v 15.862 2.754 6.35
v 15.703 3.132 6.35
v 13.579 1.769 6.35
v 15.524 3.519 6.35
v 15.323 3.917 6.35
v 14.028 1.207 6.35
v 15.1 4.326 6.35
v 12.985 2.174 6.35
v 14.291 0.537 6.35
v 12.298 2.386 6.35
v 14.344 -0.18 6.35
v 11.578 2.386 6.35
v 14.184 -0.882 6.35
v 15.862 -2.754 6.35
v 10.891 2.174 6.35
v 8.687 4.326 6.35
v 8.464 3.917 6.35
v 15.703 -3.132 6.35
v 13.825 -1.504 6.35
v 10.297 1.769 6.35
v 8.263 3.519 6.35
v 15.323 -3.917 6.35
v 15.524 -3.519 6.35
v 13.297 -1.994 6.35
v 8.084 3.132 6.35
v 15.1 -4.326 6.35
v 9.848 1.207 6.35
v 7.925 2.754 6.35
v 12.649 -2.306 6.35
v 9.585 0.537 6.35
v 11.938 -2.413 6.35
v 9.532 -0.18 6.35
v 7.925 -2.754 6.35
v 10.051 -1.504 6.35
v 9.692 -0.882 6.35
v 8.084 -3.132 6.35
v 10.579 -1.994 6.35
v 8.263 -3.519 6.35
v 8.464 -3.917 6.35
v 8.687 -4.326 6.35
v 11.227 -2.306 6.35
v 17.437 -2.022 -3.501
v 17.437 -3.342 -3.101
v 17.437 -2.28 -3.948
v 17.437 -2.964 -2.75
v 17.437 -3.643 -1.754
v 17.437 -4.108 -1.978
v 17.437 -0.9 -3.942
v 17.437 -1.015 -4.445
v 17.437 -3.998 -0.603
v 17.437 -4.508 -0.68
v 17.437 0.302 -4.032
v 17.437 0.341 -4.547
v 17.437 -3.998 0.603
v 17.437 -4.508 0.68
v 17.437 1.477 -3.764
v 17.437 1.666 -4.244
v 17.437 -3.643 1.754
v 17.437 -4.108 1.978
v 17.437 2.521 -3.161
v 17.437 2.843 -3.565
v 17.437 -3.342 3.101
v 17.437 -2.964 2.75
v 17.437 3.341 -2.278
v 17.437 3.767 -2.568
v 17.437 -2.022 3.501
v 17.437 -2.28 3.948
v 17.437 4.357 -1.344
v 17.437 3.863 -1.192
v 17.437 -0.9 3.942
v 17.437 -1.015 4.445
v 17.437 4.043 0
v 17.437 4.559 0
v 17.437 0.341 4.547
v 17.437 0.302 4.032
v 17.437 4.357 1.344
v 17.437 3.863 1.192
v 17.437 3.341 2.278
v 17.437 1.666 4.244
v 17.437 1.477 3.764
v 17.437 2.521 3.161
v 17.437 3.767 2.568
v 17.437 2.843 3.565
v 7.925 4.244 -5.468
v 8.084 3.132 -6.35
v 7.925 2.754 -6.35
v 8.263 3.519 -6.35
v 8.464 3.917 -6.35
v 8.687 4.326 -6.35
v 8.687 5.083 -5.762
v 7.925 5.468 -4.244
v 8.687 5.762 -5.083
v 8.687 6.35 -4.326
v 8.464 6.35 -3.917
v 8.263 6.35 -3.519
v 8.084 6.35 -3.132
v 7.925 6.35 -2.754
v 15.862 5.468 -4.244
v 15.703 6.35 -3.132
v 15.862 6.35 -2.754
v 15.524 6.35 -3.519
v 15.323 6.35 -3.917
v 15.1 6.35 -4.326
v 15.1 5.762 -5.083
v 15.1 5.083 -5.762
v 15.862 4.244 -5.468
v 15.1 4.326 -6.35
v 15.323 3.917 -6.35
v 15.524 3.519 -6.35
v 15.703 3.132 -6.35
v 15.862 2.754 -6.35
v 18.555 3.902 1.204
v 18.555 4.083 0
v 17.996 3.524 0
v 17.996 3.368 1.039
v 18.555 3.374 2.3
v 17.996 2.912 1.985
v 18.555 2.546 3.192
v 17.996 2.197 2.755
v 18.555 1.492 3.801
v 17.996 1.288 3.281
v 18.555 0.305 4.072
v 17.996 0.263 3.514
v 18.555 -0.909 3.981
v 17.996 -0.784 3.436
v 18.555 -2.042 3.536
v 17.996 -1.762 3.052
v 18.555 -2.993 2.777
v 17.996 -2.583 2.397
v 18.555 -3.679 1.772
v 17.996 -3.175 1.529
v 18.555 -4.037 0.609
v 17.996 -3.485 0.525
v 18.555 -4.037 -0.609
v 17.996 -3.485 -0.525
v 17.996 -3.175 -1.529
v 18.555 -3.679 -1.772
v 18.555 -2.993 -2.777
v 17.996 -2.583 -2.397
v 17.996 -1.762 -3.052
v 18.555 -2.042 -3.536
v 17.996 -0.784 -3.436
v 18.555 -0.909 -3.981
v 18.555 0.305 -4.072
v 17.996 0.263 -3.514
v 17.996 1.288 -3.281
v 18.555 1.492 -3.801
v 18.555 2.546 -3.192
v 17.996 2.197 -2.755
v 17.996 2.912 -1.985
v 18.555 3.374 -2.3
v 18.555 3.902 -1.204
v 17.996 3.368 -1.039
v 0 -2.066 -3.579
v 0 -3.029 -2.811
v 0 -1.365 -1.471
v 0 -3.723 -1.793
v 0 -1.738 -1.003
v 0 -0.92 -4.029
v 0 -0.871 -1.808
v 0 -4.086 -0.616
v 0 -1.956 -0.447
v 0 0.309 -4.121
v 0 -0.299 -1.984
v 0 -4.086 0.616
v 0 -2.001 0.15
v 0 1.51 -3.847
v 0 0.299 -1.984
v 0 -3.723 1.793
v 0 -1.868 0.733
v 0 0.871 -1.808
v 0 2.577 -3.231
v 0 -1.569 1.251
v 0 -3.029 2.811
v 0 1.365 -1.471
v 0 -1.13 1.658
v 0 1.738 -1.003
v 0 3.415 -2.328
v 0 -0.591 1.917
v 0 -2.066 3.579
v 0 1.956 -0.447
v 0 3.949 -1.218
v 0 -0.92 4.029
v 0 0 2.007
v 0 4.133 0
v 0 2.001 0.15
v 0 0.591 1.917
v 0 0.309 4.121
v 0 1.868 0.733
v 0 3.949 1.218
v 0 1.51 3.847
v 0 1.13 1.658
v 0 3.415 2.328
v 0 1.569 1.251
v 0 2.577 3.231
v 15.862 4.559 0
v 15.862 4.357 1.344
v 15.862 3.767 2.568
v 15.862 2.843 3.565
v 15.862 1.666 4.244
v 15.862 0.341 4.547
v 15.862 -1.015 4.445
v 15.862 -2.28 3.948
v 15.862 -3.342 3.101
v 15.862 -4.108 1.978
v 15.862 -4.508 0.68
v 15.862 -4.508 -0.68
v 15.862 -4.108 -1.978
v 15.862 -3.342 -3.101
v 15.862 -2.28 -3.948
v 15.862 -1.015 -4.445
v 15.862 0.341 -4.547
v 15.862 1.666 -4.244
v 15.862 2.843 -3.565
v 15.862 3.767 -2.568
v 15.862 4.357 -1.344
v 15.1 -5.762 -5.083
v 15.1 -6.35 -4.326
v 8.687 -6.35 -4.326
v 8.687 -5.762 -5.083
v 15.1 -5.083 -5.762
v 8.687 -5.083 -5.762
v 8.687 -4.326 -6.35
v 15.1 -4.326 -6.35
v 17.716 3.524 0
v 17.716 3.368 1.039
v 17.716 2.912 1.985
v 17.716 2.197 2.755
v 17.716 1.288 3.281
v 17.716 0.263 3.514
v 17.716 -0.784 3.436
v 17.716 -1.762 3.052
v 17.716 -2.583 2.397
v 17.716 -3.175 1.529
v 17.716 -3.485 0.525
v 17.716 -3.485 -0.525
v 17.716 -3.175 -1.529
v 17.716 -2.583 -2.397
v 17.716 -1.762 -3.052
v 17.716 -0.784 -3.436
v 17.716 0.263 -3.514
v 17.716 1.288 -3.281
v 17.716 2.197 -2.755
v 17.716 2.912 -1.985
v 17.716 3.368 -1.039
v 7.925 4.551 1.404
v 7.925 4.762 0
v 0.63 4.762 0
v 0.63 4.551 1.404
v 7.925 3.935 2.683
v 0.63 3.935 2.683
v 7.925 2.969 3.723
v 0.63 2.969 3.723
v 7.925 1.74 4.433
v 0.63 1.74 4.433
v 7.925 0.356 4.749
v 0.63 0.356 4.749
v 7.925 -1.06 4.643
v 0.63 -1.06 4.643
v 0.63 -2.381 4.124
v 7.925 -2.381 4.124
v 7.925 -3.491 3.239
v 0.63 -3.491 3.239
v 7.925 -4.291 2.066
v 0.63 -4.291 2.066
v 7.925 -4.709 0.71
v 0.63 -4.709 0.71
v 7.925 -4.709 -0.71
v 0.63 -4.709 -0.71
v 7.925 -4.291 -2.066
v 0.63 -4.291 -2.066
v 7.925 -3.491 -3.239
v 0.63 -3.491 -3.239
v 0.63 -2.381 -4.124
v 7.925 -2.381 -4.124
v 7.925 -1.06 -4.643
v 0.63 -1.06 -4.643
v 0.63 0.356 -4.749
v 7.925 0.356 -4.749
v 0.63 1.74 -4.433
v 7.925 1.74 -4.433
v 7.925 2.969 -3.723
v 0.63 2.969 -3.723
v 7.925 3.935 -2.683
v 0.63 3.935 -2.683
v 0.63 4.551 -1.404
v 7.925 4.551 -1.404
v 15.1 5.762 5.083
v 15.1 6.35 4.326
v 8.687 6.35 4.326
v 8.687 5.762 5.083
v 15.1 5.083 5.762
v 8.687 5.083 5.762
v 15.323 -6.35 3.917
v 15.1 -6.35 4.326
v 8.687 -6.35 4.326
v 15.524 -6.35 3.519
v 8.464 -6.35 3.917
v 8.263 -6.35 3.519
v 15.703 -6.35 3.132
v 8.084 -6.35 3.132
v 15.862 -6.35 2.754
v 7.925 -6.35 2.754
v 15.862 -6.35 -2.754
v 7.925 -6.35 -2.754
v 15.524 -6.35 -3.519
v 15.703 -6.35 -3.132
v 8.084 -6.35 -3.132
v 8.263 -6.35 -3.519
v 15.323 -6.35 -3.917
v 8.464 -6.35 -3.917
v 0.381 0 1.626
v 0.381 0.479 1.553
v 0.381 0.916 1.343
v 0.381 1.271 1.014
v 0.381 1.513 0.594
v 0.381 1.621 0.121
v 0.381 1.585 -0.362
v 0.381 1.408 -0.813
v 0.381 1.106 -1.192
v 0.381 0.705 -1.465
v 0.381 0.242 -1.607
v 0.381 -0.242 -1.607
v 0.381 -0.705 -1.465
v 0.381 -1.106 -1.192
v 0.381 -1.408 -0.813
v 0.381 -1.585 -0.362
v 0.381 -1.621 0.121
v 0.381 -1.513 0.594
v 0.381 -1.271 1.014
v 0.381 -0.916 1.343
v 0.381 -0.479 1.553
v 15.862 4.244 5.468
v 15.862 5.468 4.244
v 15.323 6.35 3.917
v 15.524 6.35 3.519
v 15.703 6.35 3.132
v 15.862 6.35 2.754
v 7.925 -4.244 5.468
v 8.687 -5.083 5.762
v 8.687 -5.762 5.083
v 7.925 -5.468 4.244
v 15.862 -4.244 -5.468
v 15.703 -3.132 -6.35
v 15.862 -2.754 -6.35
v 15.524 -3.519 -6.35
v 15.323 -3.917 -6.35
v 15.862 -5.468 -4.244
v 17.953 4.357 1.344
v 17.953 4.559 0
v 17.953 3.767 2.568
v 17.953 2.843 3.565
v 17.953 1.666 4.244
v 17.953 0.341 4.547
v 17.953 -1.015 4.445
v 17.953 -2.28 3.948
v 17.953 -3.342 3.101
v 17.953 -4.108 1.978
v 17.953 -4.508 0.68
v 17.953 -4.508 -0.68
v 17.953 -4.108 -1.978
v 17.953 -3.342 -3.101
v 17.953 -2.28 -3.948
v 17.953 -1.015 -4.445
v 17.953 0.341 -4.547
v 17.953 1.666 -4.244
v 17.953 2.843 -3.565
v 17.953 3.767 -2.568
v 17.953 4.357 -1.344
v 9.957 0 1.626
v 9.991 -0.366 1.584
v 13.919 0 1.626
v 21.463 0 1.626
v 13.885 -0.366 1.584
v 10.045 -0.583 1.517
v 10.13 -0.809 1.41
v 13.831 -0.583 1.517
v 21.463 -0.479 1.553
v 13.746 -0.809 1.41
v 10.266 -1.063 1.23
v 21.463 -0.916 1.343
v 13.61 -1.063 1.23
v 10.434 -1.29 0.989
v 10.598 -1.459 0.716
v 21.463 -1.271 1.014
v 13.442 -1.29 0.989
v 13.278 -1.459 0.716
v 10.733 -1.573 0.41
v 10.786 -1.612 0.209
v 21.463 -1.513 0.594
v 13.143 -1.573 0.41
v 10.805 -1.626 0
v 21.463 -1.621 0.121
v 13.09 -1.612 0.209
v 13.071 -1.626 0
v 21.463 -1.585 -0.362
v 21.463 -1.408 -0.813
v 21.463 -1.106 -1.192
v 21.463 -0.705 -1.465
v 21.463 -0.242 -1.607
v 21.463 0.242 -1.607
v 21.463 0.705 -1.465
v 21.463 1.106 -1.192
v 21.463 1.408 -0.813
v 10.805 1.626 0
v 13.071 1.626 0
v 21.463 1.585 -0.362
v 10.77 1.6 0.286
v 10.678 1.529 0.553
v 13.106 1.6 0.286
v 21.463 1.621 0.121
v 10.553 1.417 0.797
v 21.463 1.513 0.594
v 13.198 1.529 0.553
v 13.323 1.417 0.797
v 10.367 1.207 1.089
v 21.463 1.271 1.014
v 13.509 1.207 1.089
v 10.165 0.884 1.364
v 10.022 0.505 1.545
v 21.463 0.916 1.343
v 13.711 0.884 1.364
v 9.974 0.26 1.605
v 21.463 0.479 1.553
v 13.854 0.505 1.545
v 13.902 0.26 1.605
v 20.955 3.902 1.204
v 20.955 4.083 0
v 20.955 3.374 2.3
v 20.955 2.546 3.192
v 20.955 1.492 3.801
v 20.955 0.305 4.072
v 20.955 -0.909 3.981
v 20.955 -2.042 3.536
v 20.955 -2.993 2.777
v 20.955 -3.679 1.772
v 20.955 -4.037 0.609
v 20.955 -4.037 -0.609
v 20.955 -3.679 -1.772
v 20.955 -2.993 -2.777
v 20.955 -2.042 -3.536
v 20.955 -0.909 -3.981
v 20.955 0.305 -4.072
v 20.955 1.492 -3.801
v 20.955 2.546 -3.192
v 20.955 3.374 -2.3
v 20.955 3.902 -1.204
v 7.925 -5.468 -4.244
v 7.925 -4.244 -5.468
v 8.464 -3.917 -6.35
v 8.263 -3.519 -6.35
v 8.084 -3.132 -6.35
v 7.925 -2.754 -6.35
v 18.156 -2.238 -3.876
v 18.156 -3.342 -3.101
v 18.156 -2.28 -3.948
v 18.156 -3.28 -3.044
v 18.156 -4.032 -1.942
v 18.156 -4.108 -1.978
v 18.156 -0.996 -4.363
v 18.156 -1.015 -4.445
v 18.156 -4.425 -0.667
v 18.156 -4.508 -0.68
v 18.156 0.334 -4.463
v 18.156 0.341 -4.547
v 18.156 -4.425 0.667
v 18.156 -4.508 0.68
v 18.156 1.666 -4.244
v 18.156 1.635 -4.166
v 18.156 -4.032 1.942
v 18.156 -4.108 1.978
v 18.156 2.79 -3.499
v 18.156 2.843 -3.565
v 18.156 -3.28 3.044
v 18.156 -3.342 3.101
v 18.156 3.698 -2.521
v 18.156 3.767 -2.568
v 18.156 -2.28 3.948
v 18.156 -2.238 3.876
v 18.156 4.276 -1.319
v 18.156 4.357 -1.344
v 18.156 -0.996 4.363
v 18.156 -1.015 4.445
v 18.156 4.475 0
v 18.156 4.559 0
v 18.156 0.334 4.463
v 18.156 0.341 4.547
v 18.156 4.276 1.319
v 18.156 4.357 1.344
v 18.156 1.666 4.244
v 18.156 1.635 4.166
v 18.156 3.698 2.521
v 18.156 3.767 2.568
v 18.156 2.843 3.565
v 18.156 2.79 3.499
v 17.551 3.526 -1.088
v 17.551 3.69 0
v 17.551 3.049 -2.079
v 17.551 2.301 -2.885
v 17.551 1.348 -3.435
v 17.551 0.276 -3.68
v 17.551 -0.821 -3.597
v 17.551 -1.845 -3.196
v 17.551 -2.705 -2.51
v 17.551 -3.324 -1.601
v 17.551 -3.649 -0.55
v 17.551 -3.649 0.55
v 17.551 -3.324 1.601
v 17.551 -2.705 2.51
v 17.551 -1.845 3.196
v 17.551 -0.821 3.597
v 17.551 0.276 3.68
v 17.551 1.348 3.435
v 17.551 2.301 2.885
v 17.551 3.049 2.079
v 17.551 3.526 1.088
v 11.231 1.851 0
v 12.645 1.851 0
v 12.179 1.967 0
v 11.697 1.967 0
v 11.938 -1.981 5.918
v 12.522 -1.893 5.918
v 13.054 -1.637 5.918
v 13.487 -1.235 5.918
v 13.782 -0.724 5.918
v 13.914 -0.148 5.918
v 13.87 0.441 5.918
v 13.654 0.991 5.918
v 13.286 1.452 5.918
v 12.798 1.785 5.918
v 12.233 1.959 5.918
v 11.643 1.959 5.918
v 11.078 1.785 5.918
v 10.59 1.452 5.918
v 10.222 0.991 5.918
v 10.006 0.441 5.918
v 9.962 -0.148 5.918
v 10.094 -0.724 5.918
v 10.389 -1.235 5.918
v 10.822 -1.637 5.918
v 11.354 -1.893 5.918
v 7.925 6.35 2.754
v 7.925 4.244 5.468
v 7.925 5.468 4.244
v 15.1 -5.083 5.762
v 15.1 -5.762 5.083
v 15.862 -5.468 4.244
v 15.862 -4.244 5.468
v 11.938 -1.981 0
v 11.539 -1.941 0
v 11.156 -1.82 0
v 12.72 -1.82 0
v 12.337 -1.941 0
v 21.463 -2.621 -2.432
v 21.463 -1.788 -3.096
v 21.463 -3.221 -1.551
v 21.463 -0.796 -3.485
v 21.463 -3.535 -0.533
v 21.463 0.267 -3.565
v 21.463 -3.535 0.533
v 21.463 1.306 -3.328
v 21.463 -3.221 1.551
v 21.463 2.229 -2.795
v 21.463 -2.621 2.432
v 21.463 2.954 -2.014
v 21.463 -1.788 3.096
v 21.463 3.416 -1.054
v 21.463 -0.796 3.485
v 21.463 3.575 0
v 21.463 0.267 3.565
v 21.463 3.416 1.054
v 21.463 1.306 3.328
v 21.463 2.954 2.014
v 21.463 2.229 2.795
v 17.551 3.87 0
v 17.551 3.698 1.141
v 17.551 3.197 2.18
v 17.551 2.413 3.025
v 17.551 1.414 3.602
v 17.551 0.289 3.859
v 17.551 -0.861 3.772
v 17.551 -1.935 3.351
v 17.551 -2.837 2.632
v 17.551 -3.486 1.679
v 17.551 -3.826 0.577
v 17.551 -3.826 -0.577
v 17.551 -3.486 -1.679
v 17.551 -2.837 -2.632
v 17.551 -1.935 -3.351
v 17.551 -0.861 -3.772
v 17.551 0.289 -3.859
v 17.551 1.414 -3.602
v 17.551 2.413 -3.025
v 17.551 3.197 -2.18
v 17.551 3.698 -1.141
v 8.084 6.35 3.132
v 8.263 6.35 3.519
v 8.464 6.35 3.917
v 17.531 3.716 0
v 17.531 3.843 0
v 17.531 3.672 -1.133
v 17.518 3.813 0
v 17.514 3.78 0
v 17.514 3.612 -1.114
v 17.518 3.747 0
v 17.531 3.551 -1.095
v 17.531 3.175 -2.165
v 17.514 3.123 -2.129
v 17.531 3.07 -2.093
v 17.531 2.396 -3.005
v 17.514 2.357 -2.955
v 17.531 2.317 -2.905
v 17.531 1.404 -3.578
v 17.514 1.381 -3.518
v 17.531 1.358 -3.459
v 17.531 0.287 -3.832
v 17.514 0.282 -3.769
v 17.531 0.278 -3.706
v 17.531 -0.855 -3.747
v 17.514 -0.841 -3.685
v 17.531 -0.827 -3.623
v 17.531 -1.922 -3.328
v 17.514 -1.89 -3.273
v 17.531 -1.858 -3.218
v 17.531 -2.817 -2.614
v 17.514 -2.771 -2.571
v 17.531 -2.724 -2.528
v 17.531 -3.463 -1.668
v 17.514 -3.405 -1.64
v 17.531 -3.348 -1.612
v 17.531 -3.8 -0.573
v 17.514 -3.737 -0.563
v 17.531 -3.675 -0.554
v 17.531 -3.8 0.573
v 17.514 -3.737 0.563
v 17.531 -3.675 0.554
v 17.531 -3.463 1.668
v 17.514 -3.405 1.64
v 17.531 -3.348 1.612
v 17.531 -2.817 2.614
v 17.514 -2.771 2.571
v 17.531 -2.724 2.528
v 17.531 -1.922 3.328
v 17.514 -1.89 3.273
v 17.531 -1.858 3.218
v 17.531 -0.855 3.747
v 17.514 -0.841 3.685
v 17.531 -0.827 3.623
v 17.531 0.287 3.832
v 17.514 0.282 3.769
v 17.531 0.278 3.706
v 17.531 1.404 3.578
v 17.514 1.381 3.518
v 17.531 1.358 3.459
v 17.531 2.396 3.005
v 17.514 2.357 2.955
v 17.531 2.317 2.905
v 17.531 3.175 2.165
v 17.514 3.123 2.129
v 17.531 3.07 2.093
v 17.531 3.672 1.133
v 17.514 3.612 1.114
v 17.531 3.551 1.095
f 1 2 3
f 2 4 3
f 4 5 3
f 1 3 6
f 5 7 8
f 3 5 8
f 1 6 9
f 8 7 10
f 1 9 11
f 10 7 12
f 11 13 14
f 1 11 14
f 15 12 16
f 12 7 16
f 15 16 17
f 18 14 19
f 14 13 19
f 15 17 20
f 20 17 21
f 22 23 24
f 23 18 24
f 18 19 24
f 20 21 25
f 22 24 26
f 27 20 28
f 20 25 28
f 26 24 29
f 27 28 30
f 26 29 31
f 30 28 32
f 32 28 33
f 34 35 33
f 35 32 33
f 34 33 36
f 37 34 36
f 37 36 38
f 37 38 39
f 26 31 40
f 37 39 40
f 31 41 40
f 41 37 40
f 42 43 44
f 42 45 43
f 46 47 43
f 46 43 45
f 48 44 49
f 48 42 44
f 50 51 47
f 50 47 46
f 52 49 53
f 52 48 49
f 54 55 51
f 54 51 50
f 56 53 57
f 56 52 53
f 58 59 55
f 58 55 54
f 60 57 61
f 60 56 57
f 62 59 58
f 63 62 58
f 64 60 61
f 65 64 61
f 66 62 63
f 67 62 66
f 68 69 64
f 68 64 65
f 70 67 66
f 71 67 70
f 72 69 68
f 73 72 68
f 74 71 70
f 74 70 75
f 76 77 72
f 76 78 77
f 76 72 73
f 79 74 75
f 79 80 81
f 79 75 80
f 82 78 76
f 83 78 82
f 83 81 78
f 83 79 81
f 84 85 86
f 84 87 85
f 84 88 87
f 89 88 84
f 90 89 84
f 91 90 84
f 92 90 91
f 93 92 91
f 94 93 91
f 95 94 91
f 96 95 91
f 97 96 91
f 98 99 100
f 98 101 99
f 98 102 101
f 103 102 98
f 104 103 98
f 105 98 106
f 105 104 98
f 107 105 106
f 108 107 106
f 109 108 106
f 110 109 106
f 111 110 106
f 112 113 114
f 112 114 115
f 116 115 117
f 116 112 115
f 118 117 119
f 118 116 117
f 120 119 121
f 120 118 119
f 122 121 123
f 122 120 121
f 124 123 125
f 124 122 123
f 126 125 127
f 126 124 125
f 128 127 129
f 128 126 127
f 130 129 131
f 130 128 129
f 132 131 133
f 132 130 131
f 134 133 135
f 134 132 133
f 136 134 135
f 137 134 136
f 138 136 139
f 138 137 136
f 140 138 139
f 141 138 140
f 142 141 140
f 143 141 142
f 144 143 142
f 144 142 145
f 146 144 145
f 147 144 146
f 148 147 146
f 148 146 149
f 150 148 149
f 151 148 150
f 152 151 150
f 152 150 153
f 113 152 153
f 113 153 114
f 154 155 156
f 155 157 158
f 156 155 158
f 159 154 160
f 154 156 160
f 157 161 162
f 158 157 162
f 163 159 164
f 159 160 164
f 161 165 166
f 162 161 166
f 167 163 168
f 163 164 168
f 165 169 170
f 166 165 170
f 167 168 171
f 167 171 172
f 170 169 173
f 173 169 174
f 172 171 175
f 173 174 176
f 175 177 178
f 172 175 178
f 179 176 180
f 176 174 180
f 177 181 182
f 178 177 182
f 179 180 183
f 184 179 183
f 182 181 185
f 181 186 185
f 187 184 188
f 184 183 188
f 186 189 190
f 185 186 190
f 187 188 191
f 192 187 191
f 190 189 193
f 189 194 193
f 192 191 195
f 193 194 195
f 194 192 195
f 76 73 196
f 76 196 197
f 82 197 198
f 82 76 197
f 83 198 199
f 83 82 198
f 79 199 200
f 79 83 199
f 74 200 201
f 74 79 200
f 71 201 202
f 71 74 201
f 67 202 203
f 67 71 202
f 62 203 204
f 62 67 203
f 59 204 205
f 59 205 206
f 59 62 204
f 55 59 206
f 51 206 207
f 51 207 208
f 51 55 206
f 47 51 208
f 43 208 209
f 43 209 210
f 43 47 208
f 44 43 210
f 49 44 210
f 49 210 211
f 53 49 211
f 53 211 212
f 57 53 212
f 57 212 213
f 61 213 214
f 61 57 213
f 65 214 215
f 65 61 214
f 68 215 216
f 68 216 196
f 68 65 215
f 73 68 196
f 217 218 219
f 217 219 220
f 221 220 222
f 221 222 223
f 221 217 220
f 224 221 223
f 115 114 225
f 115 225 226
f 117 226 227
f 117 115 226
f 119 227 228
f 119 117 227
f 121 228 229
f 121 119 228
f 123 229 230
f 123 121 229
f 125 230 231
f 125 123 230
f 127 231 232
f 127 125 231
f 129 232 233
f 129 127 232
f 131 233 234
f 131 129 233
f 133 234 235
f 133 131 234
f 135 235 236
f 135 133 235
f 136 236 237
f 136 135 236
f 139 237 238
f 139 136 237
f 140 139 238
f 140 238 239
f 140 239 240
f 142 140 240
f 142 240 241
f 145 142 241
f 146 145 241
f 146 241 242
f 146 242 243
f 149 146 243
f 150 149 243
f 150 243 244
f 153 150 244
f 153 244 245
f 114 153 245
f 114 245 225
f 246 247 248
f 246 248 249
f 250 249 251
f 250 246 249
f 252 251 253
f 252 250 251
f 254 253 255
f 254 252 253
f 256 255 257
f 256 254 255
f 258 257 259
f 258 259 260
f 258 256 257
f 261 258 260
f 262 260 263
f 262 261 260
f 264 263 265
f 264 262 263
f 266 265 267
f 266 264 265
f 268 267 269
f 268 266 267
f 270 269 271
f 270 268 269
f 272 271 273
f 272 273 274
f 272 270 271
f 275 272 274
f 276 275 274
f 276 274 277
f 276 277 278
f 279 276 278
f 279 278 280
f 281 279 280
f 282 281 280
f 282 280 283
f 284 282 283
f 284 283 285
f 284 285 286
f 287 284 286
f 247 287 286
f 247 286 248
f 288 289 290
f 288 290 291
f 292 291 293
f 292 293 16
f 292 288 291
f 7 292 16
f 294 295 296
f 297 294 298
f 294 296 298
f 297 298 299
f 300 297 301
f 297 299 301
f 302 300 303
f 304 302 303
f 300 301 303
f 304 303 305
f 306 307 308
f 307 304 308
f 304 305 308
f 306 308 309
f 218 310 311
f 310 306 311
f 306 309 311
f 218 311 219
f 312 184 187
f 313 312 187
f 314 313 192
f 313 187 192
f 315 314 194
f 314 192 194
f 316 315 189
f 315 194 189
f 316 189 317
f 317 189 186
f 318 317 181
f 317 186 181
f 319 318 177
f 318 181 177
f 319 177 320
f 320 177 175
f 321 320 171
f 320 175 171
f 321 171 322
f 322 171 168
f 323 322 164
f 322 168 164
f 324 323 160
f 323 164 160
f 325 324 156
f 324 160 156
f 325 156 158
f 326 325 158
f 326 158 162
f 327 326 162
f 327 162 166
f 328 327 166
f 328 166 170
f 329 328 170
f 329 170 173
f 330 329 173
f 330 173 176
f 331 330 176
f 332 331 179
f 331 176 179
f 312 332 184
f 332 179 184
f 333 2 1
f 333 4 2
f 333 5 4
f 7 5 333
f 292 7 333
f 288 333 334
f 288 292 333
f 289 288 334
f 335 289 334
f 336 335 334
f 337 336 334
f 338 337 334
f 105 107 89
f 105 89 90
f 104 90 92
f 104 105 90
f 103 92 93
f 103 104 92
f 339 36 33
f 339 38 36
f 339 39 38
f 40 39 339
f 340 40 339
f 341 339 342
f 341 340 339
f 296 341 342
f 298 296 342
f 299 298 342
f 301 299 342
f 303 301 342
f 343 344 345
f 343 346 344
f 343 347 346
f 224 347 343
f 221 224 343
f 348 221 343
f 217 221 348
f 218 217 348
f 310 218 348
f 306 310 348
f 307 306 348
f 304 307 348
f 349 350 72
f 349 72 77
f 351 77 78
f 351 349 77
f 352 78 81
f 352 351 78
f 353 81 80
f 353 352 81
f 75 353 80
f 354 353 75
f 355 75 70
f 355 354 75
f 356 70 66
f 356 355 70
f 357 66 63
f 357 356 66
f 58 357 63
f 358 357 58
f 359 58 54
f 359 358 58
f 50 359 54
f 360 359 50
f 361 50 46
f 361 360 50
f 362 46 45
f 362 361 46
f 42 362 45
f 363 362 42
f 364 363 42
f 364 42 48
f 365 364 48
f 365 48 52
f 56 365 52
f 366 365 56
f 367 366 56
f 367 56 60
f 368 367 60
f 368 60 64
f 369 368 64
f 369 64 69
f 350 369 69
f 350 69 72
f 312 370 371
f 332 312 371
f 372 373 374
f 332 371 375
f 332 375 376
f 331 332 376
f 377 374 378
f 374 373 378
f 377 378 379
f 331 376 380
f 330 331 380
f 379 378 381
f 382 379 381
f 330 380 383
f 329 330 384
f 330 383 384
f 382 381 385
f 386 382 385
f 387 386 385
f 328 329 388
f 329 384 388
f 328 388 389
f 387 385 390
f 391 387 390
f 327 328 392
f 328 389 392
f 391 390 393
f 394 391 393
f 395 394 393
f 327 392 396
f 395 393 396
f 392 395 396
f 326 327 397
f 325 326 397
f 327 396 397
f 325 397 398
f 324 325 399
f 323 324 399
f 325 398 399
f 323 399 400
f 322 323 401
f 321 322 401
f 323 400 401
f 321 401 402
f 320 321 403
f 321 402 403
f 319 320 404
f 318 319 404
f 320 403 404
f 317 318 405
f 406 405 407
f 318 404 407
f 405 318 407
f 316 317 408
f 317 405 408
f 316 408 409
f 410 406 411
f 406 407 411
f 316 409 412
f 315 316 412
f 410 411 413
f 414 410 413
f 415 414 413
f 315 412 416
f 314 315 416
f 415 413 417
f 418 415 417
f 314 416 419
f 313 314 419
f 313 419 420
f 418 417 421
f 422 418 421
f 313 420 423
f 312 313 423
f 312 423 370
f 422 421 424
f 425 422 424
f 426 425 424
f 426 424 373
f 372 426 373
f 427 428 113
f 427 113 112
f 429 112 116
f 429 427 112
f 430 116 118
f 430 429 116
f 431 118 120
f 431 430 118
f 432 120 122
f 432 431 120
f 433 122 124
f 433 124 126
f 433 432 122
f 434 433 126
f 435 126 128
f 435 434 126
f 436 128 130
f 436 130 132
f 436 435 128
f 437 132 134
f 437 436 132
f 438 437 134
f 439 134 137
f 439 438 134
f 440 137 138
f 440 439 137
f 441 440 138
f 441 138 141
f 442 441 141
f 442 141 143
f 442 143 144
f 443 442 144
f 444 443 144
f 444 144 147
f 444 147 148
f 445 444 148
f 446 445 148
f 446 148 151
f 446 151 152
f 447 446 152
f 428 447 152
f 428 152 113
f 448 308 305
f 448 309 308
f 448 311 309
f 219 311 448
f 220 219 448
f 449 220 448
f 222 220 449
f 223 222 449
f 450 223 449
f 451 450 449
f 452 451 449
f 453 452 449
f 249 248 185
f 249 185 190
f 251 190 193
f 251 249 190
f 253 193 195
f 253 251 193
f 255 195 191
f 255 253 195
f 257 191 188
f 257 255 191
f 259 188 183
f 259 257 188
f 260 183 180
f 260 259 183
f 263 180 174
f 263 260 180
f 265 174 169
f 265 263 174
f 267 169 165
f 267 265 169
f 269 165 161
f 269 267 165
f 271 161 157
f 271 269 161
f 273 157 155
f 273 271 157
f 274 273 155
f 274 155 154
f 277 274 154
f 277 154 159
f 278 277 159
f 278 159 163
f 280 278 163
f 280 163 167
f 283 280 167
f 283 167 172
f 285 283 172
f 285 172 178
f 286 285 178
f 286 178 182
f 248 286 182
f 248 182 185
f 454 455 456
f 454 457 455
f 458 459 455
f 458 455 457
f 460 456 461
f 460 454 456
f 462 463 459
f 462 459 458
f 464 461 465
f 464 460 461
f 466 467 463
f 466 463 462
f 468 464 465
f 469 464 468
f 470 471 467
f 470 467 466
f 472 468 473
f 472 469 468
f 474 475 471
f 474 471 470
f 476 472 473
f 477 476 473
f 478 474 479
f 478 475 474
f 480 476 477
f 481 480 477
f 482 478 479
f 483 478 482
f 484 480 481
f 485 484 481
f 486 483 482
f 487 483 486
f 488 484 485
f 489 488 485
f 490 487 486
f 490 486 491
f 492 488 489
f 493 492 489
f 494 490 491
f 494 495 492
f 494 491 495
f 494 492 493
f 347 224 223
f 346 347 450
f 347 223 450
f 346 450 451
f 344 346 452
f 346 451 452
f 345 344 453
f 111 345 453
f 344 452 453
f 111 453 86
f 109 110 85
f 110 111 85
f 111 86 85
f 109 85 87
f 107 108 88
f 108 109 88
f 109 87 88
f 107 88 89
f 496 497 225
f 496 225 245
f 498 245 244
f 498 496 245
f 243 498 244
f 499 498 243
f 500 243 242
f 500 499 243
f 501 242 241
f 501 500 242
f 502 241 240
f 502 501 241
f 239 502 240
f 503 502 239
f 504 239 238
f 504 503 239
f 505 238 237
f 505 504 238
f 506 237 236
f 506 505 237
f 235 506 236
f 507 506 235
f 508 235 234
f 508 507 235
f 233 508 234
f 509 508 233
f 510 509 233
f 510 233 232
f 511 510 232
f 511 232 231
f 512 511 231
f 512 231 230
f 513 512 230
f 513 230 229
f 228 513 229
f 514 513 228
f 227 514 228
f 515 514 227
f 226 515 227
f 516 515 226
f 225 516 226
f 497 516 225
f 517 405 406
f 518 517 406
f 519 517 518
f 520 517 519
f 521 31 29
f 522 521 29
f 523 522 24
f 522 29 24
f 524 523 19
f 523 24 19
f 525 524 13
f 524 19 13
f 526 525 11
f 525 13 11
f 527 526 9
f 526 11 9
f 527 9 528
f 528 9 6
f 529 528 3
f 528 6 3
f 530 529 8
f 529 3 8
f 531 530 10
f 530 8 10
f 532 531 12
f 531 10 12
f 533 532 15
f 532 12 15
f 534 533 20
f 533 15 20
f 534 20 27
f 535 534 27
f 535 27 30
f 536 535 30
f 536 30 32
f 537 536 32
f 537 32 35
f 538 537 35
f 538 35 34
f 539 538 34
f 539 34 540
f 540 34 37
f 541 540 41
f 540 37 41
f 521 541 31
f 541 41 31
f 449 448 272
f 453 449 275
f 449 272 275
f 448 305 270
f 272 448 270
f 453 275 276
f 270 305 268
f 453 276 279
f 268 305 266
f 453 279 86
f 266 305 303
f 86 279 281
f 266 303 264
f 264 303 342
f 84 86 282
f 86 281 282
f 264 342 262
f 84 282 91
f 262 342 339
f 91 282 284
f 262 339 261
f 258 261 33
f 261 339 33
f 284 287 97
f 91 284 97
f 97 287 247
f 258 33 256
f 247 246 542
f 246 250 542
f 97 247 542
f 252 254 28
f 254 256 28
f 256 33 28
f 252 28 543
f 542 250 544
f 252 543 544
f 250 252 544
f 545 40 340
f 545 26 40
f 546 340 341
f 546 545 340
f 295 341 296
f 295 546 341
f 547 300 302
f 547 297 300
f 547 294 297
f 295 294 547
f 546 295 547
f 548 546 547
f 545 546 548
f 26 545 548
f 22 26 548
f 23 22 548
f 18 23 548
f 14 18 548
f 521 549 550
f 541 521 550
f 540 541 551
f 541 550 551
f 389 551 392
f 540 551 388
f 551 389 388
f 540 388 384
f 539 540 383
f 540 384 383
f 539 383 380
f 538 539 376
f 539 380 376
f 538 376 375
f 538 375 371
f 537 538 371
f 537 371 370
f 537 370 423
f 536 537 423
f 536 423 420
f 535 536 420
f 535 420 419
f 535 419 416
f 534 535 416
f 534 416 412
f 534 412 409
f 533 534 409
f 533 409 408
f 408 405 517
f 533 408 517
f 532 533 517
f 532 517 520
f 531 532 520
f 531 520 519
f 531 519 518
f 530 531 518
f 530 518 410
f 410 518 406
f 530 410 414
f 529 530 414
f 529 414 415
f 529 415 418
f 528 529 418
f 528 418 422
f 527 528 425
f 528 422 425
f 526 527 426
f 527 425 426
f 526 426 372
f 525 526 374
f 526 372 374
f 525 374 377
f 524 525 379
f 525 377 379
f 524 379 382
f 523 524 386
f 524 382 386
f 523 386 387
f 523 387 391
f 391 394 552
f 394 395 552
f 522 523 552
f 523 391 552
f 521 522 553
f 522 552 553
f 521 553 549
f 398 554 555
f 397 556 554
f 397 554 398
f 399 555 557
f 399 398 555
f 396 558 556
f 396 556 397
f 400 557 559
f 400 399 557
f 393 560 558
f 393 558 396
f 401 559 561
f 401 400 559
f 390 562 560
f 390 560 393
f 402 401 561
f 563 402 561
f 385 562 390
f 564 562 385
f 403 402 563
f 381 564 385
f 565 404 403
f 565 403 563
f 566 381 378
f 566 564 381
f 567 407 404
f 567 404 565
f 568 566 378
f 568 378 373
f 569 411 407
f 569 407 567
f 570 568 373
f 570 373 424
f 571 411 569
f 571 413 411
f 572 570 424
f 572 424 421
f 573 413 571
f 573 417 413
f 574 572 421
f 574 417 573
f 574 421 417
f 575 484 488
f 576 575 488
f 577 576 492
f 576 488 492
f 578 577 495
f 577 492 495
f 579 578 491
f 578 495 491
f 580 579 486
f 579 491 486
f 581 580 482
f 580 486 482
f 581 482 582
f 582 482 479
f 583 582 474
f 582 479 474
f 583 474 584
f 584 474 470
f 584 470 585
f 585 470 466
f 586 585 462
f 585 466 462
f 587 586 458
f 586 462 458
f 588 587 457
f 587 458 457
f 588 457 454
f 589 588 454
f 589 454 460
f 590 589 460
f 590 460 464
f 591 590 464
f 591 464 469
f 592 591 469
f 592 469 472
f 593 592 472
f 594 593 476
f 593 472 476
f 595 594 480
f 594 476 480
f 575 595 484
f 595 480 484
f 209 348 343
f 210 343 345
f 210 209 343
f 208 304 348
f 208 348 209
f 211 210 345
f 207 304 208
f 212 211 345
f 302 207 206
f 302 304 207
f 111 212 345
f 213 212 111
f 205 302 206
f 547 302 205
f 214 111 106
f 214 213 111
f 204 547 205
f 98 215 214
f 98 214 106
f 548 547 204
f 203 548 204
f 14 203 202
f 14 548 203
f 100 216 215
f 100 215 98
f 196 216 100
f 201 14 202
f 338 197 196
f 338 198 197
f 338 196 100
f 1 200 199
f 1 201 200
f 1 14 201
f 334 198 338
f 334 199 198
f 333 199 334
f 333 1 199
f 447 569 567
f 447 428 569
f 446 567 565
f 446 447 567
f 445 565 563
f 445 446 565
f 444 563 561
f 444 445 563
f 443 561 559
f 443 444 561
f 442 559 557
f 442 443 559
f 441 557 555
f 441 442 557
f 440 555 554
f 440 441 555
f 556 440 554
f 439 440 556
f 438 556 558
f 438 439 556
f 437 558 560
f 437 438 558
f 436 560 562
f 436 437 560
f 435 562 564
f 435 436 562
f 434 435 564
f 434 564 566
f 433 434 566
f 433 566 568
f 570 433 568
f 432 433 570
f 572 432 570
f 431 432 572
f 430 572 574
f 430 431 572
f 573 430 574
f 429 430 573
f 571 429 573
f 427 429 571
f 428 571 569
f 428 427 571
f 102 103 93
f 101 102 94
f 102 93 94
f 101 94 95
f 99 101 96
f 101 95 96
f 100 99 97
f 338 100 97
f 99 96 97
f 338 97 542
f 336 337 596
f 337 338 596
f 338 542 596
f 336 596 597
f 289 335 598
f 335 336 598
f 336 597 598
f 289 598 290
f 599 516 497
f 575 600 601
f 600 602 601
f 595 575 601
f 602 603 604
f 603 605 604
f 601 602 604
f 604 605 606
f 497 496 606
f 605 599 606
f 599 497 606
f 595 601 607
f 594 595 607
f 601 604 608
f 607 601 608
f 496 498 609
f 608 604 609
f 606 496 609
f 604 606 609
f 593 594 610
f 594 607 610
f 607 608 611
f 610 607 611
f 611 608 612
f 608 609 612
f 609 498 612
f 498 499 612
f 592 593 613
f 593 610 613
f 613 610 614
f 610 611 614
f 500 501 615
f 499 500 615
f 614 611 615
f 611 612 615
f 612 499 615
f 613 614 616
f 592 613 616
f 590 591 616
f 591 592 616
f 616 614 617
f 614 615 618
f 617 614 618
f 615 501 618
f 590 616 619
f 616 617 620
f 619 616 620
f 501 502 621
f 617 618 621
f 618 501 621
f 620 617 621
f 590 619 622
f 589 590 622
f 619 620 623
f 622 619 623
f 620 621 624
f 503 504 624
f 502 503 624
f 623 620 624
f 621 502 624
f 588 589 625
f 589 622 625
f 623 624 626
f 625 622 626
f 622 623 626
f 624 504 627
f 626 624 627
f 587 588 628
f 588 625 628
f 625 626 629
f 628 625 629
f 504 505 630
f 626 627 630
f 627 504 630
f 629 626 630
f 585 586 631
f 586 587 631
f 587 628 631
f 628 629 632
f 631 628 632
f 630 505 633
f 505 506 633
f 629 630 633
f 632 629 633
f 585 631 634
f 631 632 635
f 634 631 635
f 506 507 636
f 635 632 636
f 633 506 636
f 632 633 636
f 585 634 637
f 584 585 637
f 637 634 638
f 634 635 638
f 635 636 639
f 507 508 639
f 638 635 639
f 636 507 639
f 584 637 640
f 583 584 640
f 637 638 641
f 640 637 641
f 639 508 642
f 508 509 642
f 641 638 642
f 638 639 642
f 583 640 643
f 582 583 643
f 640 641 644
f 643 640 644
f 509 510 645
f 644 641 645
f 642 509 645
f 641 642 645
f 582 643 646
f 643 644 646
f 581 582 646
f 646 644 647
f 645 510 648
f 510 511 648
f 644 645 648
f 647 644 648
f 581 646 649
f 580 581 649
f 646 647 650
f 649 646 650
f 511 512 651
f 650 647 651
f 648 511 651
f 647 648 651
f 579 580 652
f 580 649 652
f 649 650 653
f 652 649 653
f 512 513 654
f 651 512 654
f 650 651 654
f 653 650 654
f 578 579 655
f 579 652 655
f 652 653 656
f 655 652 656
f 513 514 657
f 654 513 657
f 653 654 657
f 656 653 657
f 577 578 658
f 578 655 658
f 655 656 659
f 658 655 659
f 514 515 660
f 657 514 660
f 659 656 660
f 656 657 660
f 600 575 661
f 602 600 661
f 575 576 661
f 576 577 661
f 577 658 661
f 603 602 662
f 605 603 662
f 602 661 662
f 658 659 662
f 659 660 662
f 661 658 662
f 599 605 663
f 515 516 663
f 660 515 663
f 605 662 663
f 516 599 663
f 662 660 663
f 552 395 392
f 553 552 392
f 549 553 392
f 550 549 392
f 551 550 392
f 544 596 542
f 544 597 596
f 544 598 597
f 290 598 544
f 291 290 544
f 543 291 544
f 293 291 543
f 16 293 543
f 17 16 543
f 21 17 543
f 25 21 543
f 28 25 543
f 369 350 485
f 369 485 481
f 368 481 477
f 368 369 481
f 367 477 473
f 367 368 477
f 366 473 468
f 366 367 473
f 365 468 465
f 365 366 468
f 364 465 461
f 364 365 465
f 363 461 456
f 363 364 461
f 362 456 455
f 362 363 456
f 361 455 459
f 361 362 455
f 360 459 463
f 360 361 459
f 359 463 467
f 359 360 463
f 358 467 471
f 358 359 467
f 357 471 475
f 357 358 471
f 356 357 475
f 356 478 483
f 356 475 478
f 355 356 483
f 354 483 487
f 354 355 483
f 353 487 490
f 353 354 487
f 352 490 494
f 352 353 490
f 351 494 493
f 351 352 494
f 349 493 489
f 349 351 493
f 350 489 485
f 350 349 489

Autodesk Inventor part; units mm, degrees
sketch "Sketch_1" plane through (0, 0, 0) normal (0, 0, 1) x (1, 0, 0)
  line L0 (7.9248, 0) -> (0, 0)
  line L1 (0, 0) -> (0, 4.1326)
  line L2 (0, 4.1326) -> (0.6299, 4.7625)
  line L3 (0.6299, 4.7625) -> (7.9248, 4.7625)
  line L4 (7.9248, 4.7625) -> (7.9248, 0)
  line L5 (7.9248, 0) -> (0, 0)
revolve "Revolution1" add sketch "Sketch_1" angle 360 about axis through (7.9248, 0, 0) along (1, 0, 0)
thread "Thread1" size "3/8-24 UNF" class "2A" standard "ANSI Unified Screw Threads" full length
sketch "Sketch_3" plane through (0, 0, 0) normal (0, 0, 1) x (1, 0, 0)
  line L0 (21.463, 0) -> (7.9248, 0)
  line L1 (7.9248, 0) -> (7.9248, 6.9215)
  line L2 (7.9248, 6.9215) -> (8.6868, 7.6835)
  line L3 (8.6868, 7.6835) -> (15.1003, 7.6835)
  line L4 (15.1003, 7.6835) -> (15.8623, 6.9215)
  line L5 (15.8623, 6.9215) -> (15.8623, 3.5243)
  line L6 (15.8623, 3.5243) -> (17.9959, 3.5243)
  line L7 (17.9959, 3.5243) -> (18.5547, 4.0831)
  line L8 (18.5547, 4.0831) -> (20.955, 4.0831)
  line L9 (20.955, 4.0831) -> (21.463, 3.575)
  line L10 (21.463, 3.575) -> (21.463, 0)
  line L11 (21.463, 0) -> (7.9248, 0)
revolve "Revolution2" add sketch "Sketch_3" angle 360 about axis through (21.463, 0, 0) along (1, 0, 0)
sketch "Sketch_17" plane through (0, 0, 0) normal (0, 0, 1) x (1, 0, 0)
  line L0 (17.4371, 0) -> (15.8623, 0)
  line L1 (15.8623, 0) -> (15.8623, 4.5593)
  line L2 (15.8623, 4.5593) -> (17.4371, 4.5593)
  line L3 (17.4371, 4.5593) -> (17.4371, 0)
  line L4 (17.4371, 0) -> (15.8623, 0)
revolve "Revolution3" add sketch "Sketch_17" angle 360 about axis through (17.4371, 0, 0) along (1, 0, 0)
sketch "Sketch4" plane through (0, 0, 0) normal (-1, 0, 0) x (0, 0, 1)
  point P0 (0, 0)
hole "Hole1" at (0, 0, 0) direction (1, 0, 0) diameter 3.2512 depth 21.463 countersink diameter 4.0132 countersink angle 90
sketch "Sketch_16" plane through (0, 0, 0) normal (1, 0, 0) x (0, 1, 0)
  line L0 (-12.7, 12.7) -> (-12.7, -12.7)
  line L1 (-12.7, -12.7) -> (12.7, -12.7)
  line L2 (12.7, -12.7) -> (12.7, 12.7)
  line L3 (12.7, 12.7) -> (-12.7, 12.7)
  line L4 (-6.35, 6.35) -> (-6.35, -6.35)
  line L5 (-6.35, -6.35) -> (6.35, -6.35)
  line L6 (6.35, -6.35) -> (6.35, 6.35)
  line L7 (6.35, 6.35) -> (-6.35, 6.35)
extrude "Extrusion1" cut sketch "Sketch_16" along normal blind 21.463
sketch "Sketch6" plane through (8.6868, -4.3259, 6.35) normal (0, 0, 1) x (1, 0, 0)
  point P0 (3.2512, 4.3259)
hole "Hole2" at (11.938, 0, 6.35) direction (0, 0, -1) diameter 3.9624 depth 6.35 countersink diameter 4.826 countersink angle 90 thread size "10-32 UNF" class "2B" standard "ANSI Unified Screw Threads"
sketch "Sketch_47" plane through (0, 0, 0) normal (0, 0, 1) x (1, 0, 0)
  line L0 (17.9959, 0) -> (17.4371, 0)
  line L1 (17.4371, 4.0431) -> (17.4371, 3.2702)
  line L2 (17.4371, 3.2702) -> (17.9959, 3.2702)
  line L3 (17.9959, 3.2702) -> (17.9959, 3.5243)
  line L4 (17.9959, 3.5243) -> (17.7165, 3.5243)
  line L5 (17.7165, 3.5243) -> (17.5509, 3.6899)
  arc A0 (17.5509, 3.8695) -> (17.5509, 3.6899) centre (17.6407, 3.7797) ccw
  line L6 (17.5509, 3.8695) -> (18.1565, 4.4751)
  line L7 (18.1565, 4.4751) -> (18.1565, 4.5593)
  line L8 (18.1565, 4.5593) -> (17.9533, 4.5593)
  line L9 (17.9533, 4.5593) -> (17.4371, 4.0431)
revolve "Revolution4" add sketch "Sketch_47" angle 360 about axis through (17.9959, 0, 0) along (1, 0, 0)
ref_plane "hh_XY" through (0, 4.7625, 0) normal (0, 0, 1) x (1, 0, 0)
ref_plane "hh_YZ" through (0, 4.7625, 0) normal (1, 0, 0) x (0, 1, 0)
ref_plane "hh_ZX" through (0, 4.7625, 0) normal (0, 1, 0) x (0, 0, 1)
ref_plane "port_XY" through (11.938, 0, 0) normal (0, 0, 1) x (1, 0, 0)
ref_plane "port_YZ" through (11.938, 0, 0) normal (1, 0, 0) x (0, 1, 0)
ref_plane "port_ZX" through (11.938, 0, 0) normal (0, 1, 0) x (0, 0, 1)
ref_plane "rod_guide_XY" through (0, 0, 0) normal (1, 0, 0) x (0, 0, -1)
ref_plane "rod_guide_YZ" through (0, 0, 0) normal (0, 0, -1) x (0, 1, 0)
ref_plane "rod_guide_ZX" through (0, 0, 0) normal (0, 1, 0) x (1, 0, 0)
ref_plane "sq1_XY" through (0, 0, 6.35) normal (1, 0, 0) x (0, 0, -1)
ref_plane "sq1_YZ" through (0, 0, 6.35) normal (0, 0, -1) x (0, 1, 0)
ref_plane "sq1_ZX" through (0, 0, 6.35) normal (0, 1, 0) x (1, 0, 0)
ref_plane "sq2_XY" through (0, 0, -6.35) normal (1, 0, 0) x (0, 0, -1)
ref_plane "sq2_YZ" through (0, 0, -6.35) normal (0, 0, -1) x (0, 1, 0)
ref_plane "sq2_ZX" through (0, 0, -6.35) normal (0, 1, 0) x (1, 0, 0)
ref_plane "t1_XY" through (7.9248, 0, 0) normal (1, 0, 0) x (0, 0, -1)
ref_plane "t1_YZ" through (7.9248, 0, 0) normal (0, 0, -1) x (0, 1, 0)
ref_plane "t1_ZX" through (7.9248, 0, 0) normal (0, 1, 0) x (1, 0, 0)
ref_plane "t111_XY" through (7.9248, 0, 0) normal (1, 0, 0) x (0, 0, -1)
ref_plane "t111_YZ" through (7.9248, 0, 0) normal (0, 0, -1) x (0, 1, 0)
ref_plane "t111_ZX" through (7.9248, 0, 0) normal (0, 1, 0) x (1, 0, 0)
ref_plane "to_foot_bracket_XY" through (7.9248, 0, 0) normal (1, 0, 0) x (0, 0, -1)
ref_plane "to_foot_bracket_YZ" through (7.9248, 0, 0) normal (0, 0, -1) x (0, 1, 0)
ref_plane "to_foot_bracket_ZX" through (7.9248, 0, 0) normal (0, 1, 0) x (1, 0, 0)
ref_plane "to_nut_XY" through (7.9248, 0, 0) normal (1, 0, 0) x (0, 0, -1)
ref_plane "to_nut_YZ" through (7.9248, 0, 0) normal (0, 0, -1) x (0, 1, 0)
ref_plane "to_nut_ZX" through (7.9248, 0, 0) normal (0, 1, 0) x (1, 0, 0)
ref_plane "to_rod_XY" through (-18.415, 0, 0) normal (1, 0, 0) x (0, 0, -1)
ref_plane "to_rod_YZ" through (-18.415, 0, 0) normal (0, 0, -1) x (0, 1, 0)
ref_plane "to_rod_ZX" through (-18.415, 0, 0) normal (0, 1, 0) x (1, 0, 0)
ref_plane "to_screw_XY" through (11.938, 0, 0) normal (0, 1, 0) x (1, 0, 0)
ref_plane "to_screw_YZ" through (11.938, 0, 0) normal (1, 0, 0) x (0, 0, -1)
ref_plane "to_screw_ZX" through (11.938, 0, 0) normal (0, 0, -1) x (0, 1, 0)
ref_plane "to_trunnion_brackets_XY" through (0, 0, 0) normal (0, 1, 0) x (1, 0, 0)
ref_plane "to_trunnion_brackets_YZ" through (0, 0, 0) normal (1, 0, 0) x (0, 0, -1)
ref_plane "to_trunnion_brackets_ZX" through (0, 0, 0) normal (0, 0, -1) x (0, 1, 0)
ref_plane "to_trunnion_brackets1_XY" through (0, 6.35, 0) normal (0, 1, 0) x (1, 0, 0)
ref_plane "to_trunnion_brackets1_YZ" through (0, 6.35, 0) normal (1, 0, 0) x (0, 0, -1)
ref_plane "to_trunnion_brackets1_ZX" through (0, 6.35, 0) normal (0, 0, -1) x (0, 1, 0)
ref_plane "to_trunnion_brackets2_XY" through (0, -6.35, 0) normal (0, 1, 0) x (1, 0, 0)
ref_plane "to_trunnion_brackets2_YZ" through (0, -6.35, 0) normal (1, 0, 0) x (0, 0, -1)
ref_plane "to_trunnion_brackets2_ZX" through (0, -6.35, 0) normal (0, 0, -1) x (0, 1, 0)
ref_plane "to_tube_XY" through (17.9959, 0, 0) normal (1, 0, 0) x (0, 0, -1)
ref_plane "to_tube_YZ" through (17.9959, 0, 0) normal (0, 0, -1) x (0, 1, 0)
ref_plane "to_tube_ZX" through (17.9959, 0, 0) normal (0, 1, 0) x (1, 0, 0)
properties part number "007R000-0.725_rod_guide"
